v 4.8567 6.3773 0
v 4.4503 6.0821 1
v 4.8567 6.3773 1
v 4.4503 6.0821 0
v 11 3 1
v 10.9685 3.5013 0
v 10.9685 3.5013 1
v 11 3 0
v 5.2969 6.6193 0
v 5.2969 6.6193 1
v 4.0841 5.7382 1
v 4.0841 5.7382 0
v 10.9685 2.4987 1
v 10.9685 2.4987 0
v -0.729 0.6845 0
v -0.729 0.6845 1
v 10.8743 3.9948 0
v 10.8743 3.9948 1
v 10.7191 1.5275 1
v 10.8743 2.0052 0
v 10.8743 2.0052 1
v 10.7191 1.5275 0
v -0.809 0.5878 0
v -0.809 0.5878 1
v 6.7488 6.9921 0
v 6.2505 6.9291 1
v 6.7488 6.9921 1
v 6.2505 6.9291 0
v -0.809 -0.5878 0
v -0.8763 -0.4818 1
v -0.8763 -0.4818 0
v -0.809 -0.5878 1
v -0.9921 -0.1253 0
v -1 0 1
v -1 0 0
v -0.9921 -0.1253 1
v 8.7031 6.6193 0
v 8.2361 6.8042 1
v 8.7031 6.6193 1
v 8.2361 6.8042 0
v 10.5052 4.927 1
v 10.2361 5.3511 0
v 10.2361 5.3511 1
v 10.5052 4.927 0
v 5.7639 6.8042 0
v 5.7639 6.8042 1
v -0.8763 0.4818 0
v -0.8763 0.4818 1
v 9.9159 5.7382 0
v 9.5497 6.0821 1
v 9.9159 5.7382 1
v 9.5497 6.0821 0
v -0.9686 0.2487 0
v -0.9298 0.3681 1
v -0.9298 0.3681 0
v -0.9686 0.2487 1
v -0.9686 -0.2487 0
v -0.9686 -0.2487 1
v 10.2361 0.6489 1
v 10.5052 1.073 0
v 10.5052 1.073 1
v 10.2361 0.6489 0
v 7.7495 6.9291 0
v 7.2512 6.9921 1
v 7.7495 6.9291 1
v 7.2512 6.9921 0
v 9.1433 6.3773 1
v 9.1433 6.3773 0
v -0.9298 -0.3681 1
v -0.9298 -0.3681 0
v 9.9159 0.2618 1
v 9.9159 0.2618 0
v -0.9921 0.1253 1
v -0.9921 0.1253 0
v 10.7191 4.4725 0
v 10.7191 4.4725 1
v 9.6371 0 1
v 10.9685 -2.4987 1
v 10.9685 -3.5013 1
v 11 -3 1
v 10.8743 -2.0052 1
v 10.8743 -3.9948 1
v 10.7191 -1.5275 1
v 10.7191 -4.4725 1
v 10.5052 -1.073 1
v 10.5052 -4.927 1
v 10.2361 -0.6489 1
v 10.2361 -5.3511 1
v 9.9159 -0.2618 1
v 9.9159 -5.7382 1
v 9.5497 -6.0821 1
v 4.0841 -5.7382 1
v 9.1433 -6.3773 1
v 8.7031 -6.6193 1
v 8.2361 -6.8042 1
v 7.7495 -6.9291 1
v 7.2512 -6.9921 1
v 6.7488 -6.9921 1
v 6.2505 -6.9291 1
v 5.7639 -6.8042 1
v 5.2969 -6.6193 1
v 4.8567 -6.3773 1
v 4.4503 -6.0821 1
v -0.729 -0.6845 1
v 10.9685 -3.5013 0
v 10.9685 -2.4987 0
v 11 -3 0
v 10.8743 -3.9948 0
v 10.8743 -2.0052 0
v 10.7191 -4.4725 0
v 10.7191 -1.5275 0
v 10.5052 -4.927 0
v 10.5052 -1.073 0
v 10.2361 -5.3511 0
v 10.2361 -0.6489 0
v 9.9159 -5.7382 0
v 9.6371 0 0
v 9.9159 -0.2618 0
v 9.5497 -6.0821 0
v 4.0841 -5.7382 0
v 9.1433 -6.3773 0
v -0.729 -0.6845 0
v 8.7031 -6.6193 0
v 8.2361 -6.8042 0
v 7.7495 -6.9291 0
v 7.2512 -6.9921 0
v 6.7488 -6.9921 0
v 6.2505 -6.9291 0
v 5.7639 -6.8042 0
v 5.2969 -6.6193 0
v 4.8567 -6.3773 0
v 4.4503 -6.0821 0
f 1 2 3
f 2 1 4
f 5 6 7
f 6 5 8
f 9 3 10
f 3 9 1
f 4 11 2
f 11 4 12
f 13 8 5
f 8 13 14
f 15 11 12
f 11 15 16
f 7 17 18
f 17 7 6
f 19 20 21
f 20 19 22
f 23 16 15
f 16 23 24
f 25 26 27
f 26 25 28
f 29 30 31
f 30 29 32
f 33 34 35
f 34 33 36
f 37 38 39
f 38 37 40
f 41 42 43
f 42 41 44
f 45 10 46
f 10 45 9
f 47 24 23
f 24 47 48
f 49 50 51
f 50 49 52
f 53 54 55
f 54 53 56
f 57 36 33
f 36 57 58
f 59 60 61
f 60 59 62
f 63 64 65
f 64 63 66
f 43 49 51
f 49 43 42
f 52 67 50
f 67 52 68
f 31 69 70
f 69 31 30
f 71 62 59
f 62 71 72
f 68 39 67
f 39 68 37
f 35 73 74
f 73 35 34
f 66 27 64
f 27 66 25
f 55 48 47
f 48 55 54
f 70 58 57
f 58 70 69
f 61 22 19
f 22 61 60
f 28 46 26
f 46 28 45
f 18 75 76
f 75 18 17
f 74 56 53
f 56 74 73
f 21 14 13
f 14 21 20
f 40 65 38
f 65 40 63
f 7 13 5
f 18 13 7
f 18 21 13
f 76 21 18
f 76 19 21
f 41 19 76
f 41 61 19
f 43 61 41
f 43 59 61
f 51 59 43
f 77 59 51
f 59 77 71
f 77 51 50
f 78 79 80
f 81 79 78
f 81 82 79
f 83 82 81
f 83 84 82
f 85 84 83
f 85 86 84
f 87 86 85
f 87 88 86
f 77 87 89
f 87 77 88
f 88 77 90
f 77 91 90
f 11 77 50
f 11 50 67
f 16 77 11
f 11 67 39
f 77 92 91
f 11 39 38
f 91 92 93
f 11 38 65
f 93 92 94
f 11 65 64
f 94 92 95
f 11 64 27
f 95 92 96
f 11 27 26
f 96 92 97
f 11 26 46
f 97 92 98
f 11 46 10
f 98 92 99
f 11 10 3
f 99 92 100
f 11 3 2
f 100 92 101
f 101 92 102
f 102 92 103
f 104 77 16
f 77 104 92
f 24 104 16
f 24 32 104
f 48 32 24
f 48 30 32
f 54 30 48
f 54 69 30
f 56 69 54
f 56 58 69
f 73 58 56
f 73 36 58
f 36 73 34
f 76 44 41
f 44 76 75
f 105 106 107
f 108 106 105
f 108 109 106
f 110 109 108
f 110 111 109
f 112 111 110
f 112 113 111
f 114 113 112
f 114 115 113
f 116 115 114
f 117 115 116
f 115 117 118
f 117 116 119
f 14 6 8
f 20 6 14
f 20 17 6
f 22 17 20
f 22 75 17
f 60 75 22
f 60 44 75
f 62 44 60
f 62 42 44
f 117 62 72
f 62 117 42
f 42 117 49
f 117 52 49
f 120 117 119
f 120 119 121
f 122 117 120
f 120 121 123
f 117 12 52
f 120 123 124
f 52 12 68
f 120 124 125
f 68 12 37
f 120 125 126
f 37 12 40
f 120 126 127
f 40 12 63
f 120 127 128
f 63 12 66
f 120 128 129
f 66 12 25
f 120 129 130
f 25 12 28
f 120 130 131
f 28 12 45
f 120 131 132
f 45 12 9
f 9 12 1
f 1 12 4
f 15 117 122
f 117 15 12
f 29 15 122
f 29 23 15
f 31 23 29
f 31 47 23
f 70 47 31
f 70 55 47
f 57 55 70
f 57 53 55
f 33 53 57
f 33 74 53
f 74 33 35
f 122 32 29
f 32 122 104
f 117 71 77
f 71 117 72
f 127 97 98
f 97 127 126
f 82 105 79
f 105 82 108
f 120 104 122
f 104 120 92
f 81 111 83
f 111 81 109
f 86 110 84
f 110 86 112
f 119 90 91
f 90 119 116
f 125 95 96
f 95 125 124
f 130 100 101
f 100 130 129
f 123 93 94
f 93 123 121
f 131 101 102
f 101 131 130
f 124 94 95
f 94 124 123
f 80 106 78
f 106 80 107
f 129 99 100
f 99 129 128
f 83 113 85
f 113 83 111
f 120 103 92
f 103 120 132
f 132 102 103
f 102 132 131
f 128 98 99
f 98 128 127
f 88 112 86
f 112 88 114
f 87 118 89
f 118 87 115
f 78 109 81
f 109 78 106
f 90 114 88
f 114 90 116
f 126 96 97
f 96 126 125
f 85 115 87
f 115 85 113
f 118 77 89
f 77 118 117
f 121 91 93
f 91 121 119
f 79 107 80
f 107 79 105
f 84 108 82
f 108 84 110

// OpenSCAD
//Transforming Shapes - Design Time: Heart

$fn = 50;

hull() {
    cylinder(h=1, r=1);
    translate([7, 3, 0]) cylinder(h=1, r=4);
}
mirror([0, 1, 0]) hull() {
    cylinder(h=1, r=1);
    translate([7, 3, 0]) cylinder(h=1, r=4);
}
